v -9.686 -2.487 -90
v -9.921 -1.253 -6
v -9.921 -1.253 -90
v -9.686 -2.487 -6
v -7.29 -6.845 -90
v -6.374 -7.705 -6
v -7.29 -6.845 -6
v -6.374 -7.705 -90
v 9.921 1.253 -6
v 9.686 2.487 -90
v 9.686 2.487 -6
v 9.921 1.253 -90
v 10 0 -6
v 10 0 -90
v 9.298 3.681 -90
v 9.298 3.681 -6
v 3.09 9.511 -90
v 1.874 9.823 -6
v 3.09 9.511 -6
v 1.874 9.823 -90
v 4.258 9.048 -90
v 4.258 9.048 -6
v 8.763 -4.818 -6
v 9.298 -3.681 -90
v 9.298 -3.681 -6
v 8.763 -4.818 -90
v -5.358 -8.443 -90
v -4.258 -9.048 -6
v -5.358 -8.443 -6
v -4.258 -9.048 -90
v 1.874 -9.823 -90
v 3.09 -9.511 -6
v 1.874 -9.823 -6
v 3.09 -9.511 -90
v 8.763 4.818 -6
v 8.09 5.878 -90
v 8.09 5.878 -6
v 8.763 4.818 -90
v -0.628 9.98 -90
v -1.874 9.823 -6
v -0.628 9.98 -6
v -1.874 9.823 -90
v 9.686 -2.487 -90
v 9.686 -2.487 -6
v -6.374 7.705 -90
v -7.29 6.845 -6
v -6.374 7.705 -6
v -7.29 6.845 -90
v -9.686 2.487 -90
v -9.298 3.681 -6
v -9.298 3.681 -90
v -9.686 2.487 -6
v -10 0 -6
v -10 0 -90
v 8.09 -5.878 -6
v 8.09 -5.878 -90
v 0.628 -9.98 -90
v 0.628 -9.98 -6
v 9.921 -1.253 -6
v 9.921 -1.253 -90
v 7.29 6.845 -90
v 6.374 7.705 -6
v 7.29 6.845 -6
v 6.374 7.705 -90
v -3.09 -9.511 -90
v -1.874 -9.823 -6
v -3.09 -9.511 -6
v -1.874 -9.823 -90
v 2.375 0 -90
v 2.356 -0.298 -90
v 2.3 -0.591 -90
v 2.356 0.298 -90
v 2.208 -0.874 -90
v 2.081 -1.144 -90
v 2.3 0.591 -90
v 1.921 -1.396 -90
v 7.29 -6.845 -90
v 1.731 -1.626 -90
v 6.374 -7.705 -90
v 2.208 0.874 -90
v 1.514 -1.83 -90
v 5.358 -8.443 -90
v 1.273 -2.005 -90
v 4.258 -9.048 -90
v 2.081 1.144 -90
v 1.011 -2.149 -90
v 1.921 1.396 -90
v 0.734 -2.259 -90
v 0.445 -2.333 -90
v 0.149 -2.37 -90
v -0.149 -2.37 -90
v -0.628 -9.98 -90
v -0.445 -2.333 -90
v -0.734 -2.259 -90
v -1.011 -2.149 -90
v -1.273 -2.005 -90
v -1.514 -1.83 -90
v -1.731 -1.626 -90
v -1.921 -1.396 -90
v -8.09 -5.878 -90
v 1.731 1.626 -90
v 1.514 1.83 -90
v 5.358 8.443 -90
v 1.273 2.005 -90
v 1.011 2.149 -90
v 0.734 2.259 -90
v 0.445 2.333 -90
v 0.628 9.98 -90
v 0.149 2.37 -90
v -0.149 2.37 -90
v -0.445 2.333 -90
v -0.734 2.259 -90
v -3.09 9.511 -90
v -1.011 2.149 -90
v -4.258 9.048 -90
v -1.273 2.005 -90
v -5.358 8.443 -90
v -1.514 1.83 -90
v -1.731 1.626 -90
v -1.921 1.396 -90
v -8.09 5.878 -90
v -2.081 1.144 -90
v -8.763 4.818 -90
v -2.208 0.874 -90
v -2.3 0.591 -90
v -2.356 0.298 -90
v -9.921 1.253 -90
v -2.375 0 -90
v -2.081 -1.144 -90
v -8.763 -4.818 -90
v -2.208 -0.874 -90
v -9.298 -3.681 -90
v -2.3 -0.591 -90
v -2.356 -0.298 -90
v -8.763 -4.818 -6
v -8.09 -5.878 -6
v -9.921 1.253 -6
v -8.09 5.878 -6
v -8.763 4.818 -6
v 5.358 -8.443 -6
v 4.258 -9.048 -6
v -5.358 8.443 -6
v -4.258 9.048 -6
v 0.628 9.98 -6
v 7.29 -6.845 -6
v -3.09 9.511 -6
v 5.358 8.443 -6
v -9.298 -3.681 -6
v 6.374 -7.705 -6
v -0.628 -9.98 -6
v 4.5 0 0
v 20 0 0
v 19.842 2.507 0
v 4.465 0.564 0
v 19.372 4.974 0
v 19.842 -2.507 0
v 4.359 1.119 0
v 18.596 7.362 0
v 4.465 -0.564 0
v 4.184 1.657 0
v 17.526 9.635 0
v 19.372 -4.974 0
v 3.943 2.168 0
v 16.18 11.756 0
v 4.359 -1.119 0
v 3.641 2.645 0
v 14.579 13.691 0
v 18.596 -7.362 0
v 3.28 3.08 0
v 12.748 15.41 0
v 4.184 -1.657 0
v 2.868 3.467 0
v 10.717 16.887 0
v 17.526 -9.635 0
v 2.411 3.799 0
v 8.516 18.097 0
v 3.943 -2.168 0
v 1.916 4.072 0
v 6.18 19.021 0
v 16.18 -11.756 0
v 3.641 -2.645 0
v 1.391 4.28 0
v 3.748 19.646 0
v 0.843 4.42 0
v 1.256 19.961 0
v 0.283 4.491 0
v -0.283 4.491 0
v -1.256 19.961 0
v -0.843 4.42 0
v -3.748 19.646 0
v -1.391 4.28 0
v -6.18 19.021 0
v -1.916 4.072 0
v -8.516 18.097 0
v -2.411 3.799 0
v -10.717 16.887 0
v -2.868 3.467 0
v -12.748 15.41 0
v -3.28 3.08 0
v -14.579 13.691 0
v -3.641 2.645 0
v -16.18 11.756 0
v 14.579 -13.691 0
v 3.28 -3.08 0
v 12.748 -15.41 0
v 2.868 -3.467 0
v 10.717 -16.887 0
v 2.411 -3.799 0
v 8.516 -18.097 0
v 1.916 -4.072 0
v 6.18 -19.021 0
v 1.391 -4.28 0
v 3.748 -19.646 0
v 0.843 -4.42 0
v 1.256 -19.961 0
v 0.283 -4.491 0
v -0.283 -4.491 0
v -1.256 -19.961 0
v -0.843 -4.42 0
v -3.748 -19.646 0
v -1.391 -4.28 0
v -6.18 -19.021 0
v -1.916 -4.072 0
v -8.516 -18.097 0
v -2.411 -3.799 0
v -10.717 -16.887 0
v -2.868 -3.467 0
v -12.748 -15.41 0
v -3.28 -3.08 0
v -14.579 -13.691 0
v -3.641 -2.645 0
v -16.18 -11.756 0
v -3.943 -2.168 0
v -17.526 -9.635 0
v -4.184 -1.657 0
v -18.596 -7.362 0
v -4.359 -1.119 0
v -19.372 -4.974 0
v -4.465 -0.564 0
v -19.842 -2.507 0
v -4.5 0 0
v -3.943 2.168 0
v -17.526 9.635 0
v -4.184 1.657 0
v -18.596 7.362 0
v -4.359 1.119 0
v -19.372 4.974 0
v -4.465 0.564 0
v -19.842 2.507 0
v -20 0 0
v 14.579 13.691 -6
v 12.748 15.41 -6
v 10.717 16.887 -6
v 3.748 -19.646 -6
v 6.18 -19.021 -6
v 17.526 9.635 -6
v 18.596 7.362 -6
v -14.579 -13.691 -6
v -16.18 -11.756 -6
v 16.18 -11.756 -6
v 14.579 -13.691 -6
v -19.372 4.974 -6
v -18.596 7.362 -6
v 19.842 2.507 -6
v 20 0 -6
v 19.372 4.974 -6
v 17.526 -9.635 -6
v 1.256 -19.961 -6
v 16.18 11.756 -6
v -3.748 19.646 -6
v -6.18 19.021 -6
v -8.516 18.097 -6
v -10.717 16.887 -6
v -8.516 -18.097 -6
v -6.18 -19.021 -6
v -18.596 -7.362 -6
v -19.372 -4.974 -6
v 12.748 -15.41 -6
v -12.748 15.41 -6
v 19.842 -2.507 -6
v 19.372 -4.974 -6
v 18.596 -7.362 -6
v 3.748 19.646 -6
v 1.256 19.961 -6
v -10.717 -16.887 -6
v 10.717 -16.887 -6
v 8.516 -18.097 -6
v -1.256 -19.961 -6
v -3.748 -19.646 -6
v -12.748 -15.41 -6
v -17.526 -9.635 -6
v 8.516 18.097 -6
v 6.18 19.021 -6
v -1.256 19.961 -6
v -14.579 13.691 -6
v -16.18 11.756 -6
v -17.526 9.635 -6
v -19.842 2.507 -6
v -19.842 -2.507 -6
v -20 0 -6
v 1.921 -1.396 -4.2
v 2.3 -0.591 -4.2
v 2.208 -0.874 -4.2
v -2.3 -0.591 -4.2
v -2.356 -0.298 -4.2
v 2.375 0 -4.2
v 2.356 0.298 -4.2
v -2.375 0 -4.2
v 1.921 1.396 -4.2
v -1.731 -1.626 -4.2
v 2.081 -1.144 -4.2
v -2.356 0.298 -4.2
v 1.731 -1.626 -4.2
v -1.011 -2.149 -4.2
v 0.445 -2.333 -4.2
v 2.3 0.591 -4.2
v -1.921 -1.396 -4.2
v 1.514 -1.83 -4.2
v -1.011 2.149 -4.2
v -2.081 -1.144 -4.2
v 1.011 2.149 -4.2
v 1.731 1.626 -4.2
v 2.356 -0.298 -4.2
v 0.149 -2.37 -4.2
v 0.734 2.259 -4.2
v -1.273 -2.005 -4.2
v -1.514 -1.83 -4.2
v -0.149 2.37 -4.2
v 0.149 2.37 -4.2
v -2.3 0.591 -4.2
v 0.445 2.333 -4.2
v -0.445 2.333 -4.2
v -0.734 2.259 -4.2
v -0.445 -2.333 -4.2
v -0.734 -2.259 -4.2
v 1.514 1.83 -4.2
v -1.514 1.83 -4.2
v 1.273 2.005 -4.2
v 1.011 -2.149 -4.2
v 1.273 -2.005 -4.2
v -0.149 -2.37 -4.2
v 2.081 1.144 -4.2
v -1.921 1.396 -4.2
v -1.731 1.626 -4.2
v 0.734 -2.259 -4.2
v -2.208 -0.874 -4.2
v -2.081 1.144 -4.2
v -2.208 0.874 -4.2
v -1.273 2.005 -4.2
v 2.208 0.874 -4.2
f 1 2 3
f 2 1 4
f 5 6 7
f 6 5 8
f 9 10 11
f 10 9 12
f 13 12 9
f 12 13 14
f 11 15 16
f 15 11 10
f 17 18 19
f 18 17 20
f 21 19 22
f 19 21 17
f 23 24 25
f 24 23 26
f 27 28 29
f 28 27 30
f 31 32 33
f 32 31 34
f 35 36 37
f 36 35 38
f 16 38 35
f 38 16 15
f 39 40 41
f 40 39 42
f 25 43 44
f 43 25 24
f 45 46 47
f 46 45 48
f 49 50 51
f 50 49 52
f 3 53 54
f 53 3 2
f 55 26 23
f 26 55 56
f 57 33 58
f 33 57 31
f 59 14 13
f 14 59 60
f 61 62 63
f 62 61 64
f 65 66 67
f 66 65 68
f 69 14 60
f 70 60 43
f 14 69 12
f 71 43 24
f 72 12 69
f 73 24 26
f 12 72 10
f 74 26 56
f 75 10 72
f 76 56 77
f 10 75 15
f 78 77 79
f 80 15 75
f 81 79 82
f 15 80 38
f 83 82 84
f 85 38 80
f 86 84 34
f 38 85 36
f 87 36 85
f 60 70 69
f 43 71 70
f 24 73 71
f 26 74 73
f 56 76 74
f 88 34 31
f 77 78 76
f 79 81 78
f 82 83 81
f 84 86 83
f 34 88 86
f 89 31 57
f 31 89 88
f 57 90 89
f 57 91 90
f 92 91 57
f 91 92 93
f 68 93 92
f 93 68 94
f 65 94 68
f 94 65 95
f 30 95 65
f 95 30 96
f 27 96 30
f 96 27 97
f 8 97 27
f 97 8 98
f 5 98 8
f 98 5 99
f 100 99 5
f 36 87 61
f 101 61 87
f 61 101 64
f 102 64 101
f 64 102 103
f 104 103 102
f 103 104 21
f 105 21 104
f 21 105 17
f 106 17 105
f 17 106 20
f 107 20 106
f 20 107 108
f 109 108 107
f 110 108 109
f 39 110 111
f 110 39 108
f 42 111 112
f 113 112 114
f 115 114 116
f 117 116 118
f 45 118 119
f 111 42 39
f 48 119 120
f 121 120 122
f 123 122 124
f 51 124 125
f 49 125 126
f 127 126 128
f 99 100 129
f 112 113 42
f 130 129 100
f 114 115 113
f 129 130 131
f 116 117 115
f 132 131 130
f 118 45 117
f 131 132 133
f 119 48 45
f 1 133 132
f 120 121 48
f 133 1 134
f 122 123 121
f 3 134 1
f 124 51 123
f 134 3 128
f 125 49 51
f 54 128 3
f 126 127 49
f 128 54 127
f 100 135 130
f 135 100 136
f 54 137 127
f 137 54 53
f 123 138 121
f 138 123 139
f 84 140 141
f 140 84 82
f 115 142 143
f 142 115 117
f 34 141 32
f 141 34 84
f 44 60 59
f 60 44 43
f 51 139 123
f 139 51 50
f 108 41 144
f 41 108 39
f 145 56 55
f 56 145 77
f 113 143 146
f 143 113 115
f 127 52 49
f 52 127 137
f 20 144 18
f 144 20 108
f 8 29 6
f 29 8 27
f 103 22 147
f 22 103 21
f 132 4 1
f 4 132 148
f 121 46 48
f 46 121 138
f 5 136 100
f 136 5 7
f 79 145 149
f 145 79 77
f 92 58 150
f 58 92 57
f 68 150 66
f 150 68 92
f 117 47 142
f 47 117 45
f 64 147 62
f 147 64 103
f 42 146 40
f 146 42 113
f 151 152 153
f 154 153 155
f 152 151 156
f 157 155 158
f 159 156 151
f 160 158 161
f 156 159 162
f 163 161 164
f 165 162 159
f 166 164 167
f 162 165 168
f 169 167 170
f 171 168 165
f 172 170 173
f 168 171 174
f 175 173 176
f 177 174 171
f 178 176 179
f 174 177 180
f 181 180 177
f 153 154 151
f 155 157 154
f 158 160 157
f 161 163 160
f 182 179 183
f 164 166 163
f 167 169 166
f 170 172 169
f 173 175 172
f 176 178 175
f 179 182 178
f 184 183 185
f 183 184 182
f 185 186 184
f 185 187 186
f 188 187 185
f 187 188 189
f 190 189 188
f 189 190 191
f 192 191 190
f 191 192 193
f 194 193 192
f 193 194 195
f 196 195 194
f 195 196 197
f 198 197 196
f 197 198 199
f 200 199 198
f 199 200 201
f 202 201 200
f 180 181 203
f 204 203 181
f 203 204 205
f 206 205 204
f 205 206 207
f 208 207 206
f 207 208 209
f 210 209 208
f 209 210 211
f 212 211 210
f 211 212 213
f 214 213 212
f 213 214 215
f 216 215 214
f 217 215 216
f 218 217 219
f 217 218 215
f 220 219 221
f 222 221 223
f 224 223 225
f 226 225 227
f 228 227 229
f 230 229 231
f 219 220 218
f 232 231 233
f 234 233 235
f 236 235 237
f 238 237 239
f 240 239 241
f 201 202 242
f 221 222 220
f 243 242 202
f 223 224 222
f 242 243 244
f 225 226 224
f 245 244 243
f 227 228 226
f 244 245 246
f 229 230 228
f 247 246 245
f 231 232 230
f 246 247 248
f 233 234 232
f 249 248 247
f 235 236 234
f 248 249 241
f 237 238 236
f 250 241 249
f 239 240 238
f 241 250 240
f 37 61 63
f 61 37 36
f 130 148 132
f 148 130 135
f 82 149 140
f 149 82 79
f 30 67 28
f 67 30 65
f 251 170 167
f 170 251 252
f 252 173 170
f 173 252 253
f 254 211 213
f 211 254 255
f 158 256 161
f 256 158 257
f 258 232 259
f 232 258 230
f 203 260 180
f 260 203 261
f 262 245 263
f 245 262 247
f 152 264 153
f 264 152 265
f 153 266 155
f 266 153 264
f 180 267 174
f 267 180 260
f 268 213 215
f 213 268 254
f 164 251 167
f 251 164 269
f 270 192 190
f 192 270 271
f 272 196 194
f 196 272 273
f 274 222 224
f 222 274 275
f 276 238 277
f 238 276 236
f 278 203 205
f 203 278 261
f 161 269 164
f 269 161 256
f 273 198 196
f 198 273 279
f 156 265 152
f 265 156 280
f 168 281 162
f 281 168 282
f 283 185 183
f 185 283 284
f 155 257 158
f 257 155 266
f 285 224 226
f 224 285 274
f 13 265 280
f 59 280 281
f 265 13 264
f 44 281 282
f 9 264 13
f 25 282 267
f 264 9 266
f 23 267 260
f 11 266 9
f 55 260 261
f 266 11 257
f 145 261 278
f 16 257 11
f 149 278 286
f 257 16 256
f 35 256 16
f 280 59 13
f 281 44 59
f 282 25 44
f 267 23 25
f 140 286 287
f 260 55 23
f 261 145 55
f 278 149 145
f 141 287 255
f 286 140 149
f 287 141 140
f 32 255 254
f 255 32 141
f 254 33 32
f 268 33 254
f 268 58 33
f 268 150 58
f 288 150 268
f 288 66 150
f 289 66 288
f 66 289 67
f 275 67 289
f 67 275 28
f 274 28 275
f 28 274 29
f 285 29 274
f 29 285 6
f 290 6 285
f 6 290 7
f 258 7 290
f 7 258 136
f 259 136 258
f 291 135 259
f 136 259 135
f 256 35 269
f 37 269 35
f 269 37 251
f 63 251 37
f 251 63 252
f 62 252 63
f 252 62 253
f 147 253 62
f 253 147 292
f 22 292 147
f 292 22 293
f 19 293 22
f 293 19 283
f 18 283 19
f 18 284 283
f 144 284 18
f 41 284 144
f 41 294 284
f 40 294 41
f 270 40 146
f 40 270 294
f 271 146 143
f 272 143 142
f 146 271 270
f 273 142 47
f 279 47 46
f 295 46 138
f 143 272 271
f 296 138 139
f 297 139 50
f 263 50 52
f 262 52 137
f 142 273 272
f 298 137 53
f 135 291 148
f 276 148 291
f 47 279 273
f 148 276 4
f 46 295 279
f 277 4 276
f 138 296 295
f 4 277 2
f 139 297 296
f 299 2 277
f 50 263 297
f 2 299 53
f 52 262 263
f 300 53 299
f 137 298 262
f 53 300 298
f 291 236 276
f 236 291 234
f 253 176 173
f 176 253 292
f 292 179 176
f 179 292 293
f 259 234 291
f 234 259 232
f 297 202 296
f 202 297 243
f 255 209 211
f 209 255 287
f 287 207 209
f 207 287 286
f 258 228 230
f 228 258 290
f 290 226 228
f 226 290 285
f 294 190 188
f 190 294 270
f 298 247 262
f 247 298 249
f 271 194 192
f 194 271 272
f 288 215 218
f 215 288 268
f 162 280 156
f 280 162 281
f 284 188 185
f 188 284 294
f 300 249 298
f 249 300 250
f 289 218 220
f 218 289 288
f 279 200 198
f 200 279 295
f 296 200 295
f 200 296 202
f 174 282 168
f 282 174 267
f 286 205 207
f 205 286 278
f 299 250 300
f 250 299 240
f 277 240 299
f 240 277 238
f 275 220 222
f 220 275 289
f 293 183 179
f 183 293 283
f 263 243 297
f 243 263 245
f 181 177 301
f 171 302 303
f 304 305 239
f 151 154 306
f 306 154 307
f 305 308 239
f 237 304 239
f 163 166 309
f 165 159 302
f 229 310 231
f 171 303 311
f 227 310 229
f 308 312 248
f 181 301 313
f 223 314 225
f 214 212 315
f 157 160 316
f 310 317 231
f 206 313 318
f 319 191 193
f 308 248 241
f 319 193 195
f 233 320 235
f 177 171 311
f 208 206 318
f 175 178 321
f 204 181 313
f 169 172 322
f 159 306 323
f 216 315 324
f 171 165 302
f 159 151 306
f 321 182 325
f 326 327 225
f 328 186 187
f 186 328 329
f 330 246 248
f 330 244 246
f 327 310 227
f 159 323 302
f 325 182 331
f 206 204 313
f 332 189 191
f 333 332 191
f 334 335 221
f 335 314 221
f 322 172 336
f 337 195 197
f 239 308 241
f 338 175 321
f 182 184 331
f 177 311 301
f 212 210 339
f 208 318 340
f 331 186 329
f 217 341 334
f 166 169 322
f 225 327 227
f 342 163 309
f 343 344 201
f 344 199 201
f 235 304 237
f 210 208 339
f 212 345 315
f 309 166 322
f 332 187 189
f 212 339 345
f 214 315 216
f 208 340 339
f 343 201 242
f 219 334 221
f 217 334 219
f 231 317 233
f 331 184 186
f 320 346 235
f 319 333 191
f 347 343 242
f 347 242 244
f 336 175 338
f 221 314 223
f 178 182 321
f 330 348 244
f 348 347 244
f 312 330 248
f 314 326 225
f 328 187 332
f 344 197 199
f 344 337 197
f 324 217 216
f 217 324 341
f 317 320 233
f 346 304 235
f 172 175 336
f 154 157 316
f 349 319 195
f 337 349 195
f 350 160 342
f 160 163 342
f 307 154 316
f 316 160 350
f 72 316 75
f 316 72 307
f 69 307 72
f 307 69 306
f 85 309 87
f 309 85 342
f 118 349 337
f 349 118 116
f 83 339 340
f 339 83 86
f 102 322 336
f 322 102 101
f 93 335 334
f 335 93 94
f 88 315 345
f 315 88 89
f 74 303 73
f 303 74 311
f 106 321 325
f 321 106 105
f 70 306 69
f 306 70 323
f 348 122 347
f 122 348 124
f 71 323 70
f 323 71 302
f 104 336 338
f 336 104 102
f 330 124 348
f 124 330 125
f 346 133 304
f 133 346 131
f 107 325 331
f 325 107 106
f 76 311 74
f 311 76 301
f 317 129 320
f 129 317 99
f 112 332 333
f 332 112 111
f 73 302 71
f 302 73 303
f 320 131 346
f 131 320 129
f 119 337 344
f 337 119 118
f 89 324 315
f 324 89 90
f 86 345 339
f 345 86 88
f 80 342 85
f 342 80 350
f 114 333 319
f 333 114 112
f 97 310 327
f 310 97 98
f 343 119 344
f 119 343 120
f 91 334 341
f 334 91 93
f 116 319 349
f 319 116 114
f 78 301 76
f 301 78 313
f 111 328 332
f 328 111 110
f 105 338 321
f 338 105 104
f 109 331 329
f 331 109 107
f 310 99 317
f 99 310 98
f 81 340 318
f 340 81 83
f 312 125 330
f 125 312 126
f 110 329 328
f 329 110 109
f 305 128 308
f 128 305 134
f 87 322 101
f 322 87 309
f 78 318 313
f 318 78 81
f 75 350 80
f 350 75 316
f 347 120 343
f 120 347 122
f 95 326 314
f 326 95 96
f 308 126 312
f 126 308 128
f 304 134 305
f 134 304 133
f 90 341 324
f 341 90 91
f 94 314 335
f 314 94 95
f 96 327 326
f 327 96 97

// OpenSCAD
$fn = 50;


difference() {
	union() {
		translate(v = [0, 0, -90.0000000000]) {
			cylinder(h = 90, r = 10.0000000000);
		}
		translate(v = [0, 0, -6.0000000000]) {
			cylinder(h = 6, r = 20.0000000000);
		}
	}
	union() {
		translate(v = [0, 0, 0]) {
			rotate(a = [0, 0, 0]) {
				difference() {
					union() {
						#translate(v = [0, 0, -90.0000000000]) {
							cylinder(h = 90, r = 2.2500000000);
						}
						#translate(v = [0, 0, -4.2000000000]) {
							cylinder(h = 4.2000000000, r = 10.0000000000, r1 = 2.3750000000, r2 = 4.5000000000);
						}
						#translate(v = [0, 0, -90.0000000000]) {
							cylinder(h = 90, r = 2.3750000000);
						}
						#translate(v = [0, 0, -90.0000000000]) {
							cylinder(h = 90, r = 2.2500000000);
						}
					}
					union();
				}
			}
		}
	}
}
